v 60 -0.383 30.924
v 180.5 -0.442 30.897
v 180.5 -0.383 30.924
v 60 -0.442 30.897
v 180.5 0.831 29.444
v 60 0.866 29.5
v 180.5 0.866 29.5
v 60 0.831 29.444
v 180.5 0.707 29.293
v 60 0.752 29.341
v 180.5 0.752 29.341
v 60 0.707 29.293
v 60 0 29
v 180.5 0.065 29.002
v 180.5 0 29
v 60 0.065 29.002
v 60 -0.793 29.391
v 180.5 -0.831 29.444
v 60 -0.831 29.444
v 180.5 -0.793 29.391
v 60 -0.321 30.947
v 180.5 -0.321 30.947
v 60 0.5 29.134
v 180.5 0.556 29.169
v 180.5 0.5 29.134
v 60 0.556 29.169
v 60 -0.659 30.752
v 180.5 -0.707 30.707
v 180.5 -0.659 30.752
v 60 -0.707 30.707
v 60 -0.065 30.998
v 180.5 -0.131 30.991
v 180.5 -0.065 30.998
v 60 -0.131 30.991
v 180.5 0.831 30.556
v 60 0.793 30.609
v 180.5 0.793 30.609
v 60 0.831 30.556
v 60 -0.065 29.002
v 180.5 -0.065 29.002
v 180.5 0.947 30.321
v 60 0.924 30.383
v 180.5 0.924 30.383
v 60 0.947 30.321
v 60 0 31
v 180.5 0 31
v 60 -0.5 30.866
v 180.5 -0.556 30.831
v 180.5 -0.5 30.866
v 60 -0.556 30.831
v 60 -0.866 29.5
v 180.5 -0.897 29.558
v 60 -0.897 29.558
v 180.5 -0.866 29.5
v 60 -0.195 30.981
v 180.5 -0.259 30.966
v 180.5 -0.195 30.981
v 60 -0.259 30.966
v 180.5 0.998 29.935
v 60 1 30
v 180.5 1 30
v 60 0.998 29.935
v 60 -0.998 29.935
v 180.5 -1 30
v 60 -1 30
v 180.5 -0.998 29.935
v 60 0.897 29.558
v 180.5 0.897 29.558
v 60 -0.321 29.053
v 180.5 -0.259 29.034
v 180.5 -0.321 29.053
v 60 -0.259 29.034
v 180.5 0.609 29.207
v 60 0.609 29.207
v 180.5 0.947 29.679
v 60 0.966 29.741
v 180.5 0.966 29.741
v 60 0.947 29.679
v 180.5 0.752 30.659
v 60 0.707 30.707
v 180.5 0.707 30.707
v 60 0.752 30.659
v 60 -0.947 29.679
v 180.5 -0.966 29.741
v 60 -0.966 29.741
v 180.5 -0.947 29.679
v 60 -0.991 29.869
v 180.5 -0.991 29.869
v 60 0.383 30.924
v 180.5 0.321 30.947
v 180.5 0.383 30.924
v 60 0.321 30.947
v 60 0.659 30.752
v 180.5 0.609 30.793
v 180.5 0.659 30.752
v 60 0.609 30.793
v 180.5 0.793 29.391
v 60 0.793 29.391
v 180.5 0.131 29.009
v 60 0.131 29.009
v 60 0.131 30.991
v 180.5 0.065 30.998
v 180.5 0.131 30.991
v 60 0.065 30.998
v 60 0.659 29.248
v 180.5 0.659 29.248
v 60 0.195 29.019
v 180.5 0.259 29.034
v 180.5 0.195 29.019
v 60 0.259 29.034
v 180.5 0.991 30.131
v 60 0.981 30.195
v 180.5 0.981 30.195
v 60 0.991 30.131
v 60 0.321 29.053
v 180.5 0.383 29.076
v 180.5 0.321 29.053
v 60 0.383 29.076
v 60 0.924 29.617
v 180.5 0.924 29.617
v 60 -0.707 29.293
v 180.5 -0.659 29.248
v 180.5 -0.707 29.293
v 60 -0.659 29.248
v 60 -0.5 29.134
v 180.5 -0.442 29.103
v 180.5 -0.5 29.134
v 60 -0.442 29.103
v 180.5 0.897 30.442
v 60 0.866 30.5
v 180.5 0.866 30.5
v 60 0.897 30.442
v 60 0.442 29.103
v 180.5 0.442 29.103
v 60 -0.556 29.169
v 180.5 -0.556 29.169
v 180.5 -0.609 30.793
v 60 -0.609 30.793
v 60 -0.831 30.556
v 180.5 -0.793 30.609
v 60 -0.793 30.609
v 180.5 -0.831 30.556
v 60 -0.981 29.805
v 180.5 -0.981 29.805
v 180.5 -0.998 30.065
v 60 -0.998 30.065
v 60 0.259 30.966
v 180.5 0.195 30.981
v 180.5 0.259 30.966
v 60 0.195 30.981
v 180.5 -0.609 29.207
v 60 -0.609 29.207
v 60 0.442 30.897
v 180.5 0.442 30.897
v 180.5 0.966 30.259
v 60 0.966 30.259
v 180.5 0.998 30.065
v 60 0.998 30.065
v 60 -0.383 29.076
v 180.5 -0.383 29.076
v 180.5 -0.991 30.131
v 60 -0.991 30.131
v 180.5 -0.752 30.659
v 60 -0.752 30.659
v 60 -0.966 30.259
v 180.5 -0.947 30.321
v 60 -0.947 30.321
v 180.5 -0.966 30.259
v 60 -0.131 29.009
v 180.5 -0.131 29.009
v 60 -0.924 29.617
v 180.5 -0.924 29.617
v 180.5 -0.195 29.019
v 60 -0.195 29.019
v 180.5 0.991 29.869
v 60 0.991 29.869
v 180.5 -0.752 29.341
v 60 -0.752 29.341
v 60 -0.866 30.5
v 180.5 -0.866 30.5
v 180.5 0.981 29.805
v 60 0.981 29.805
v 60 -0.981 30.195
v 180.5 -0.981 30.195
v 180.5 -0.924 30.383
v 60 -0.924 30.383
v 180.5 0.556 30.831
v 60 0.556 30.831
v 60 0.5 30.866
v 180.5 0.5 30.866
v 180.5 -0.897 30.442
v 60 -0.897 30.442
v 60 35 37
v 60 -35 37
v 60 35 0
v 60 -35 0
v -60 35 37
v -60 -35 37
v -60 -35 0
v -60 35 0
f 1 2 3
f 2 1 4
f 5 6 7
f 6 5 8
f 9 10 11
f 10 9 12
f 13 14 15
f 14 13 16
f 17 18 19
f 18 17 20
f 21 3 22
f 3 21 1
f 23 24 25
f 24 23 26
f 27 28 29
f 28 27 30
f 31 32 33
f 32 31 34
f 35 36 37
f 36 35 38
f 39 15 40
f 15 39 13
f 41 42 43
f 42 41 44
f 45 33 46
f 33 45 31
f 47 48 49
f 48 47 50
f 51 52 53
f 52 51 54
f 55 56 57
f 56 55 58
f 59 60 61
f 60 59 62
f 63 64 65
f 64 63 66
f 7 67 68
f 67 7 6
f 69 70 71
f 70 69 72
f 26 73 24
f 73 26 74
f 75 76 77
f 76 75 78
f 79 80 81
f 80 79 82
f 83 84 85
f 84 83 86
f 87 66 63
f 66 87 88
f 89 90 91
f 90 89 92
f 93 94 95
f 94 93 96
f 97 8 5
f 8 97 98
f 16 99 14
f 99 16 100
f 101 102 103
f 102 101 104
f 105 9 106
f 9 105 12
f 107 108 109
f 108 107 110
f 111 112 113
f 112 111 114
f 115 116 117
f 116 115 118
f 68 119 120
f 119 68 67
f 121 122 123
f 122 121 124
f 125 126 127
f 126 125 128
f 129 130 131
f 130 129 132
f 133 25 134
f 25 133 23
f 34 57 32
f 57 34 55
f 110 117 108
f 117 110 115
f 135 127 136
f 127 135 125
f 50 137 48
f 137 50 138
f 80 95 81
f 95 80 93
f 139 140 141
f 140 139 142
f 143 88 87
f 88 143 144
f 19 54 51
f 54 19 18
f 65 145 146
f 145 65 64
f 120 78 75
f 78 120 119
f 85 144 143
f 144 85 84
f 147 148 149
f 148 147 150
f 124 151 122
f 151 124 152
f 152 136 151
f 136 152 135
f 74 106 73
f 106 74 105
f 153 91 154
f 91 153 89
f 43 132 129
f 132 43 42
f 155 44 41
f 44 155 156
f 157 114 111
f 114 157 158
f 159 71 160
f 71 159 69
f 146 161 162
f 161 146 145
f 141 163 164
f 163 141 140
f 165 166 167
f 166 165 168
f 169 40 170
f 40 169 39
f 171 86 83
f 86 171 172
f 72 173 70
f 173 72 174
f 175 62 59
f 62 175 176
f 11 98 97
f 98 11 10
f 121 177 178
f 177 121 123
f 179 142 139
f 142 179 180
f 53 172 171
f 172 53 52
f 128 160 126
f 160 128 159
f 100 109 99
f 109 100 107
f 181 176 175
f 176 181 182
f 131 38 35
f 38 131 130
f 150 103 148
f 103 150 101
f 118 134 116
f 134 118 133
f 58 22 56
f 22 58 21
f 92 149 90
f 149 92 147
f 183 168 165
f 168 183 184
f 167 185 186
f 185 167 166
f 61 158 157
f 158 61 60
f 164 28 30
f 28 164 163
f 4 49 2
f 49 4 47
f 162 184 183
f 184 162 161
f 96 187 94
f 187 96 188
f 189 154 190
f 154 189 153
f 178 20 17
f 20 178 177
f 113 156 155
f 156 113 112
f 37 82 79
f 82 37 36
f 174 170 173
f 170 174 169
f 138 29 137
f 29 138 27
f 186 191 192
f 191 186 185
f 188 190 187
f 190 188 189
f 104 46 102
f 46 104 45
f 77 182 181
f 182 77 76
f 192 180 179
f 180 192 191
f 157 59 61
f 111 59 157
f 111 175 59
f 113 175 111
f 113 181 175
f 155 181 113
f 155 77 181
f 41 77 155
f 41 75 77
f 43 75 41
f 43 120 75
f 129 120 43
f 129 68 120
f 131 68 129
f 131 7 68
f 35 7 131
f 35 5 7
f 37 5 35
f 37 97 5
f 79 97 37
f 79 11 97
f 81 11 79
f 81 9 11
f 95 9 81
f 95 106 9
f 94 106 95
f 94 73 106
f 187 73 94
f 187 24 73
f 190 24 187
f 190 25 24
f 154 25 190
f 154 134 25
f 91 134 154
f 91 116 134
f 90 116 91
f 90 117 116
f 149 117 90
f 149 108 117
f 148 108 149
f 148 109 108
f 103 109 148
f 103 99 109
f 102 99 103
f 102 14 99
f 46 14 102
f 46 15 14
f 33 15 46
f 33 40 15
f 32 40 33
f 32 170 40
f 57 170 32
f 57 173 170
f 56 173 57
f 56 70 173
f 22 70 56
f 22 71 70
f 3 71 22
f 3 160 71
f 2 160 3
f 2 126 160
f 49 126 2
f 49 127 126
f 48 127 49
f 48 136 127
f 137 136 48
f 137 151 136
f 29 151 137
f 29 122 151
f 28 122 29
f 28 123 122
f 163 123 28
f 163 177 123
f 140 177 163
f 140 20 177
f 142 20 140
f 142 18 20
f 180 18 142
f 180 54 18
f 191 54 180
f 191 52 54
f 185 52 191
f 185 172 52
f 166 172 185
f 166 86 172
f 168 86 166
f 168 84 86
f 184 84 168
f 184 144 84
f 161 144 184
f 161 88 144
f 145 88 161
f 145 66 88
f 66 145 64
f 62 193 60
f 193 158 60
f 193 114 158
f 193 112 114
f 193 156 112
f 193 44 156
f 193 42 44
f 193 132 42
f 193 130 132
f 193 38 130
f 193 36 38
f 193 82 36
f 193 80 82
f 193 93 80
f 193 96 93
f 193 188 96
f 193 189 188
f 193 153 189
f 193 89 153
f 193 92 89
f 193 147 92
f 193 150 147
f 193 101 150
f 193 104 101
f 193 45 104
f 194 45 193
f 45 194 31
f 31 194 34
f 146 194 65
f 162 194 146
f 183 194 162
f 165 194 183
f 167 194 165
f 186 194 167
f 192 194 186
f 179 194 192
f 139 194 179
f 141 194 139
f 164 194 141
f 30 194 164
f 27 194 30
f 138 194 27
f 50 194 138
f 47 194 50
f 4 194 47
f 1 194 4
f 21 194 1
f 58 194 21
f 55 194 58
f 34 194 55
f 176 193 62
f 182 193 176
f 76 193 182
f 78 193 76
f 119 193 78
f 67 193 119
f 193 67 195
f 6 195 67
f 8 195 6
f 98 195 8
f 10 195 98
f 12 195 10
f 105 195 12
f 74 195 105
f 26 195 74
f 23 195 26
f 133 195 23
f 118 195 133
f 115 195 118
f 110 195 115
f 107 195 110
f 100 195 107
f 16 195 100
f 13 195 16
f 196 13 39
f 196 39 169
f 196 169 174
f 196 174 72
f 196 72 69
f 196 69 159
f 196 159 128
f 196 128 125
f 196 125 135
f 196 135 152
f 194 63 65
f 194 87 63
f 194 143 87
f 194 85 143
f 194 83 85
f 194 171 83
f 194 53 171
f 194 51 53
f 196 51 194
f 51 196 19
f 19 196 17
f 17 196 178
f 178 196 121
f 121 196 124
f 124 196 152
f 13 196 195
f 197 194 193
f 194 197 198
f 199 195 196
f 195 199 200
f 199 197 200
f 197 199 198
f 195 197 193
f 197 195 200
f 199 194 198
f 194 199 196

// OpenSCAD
// Mini horizontal gel-electrophoresis box - buffer tank
// Print orientation: tank rests on XY plane (z = 0), builds upward (+Z)

// ---------------- Parameters ----------------
outer_x   = 120;   // outer length in X (mm)
outer_y   = 70;    // outer width in Y (mm)
outer_z   = 40;    // outer height in Z (mm)

wall      = 3;     // wall thickness (mm)
floor     = 3;     // floor thickness (mm)

platform_x = 60;   // platform length in X (mm), centred
platform_top_z = 13; // height of platform top above inner floor (mm)

hole_d    = 2;     // electrode hole diameter (mm)
hole_y    = 0;     // hole centre Y position (mm)
hole_z    = 30;    // hole centre Z position (mm)

eps       = 0.5;   // cutter overshoot past faces (mm)
$fn       = 96;    // curve resolution

// ---------------- Derived ----------------
inner_x = outer_x - 2*wall;   // 114 mm
inner_y = outer_y - 2*wall;   // 64 mm
inner_floor_z = floor;        // 3 mm (inner floor lies on z = floor)

platform_bottom_z = inner_floor_z + wall + (platform_top_z - floor);
// = 3 + 3 + 7 = 13 mm (platform bottom at inner floor level, top at z = 13)

// ---------------- Model ----------------
union() {
    // Main tank body (open top)
    translate([-outer_x/2, -outer_y/2, 0])
        cube([outer_x, outer_y, outer_z - floor]);

    // Raised gel-tray platform, centred in X, spanning full Y
    translate([-outer_x/2, -outer_y/2, platform_bottom_z])
        cube([outer_x, outer_y, platform_top_z - floor]);

    // Electrode holes through each end wall, along X
    for (sx = [-1, 1])
        translate([sx > 0 ? outer_x/2 - eps : -outer_x/2 + eps, hole_y, hole_z])
            rotate([0, 90, 0])
                cylinder(d = hole_d, h = outer_x + 2*eps);
}
